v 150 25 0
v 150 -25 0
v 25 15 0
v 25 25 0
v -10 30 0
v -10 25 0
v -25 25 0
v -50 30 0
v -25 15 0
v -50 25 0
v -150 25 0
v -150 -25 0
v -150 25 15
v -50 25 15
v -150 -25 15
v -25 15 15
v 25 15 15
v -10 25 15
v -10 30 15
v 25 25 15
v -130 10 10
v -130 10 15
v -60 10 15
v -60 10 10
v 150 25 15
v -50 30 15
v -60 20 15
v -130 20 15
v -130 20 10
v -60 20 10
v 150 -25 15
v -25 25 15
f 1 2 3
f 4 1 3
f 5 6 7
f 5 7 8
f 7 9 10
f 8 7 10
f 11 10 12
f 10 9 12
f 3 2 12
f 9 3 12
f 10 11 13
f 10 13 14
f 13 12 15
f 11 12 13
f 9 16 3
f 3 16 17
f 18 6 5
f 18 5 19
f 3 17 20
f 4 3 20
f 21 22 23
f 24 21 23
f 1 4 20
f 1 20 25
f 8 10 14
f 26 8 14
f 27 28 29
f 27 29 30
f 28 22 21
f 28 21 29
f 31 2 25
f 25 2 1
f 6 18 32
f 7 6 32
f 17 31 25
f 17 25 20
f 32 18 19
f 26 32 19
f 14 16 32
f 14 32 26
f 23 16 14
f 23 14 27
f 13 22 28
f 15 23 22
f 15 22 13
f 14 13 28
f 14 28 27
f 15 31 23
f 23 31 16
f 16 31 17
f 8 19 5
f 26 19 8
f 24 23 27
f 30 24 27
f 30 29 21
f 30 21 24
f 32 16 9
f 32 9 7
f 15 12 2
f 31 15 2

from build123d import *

# Parameters (mm, degrees)
F0_W     = 300
F0_H     = 50
F1_DEPTH = 15
F2_W     = 50
F2_H     = 10
F3_DEPTH = 15.001
F5_W     = 40
F5_H     = 15
F6_DEPTH = 5
F7_W     = 70
F7_H     = 10
F8_DEPTH = 5


with BuildPart() as f1:
    # F0 (on Top) → F1 (new body)
    with BuildSketch(Plane.XY):
        Rectangle(F0_W, F0_H)
    extrude(amount=F1_DEPTH)

    # F2 (on face) → F3 (cut, through all)
    with BuildSketch(Plane.XY.offset(15)):
        with Locations((0, 20)):
            Rectangle(F2_W, F2_H)
    extrude(amount=-F3_DEPTH, mode=Mode.SUBTRACT)

    # F5 (on face) → F6 (join)
    with BuildSketch(Plane(origin=(0, 25, 0), x_dir=(-1, 0, 0), z_dir=(0, 1, 0))):
        with Locations((30, 7.5)):
            Rectangle(F5_W, F5_H)
    extrude(amount=F6_DEPTH)

    # F7 (on face) → F8 (cut)
    with BuildSketch(Plane.XY.offset(15)):
        with Locations((-95, 15)):
            Rectangle(F7_W, F7_H)
    extrude(amount=-F8_DEPTH, mode=Mode.SUBTRACT)


solid = f1.part
